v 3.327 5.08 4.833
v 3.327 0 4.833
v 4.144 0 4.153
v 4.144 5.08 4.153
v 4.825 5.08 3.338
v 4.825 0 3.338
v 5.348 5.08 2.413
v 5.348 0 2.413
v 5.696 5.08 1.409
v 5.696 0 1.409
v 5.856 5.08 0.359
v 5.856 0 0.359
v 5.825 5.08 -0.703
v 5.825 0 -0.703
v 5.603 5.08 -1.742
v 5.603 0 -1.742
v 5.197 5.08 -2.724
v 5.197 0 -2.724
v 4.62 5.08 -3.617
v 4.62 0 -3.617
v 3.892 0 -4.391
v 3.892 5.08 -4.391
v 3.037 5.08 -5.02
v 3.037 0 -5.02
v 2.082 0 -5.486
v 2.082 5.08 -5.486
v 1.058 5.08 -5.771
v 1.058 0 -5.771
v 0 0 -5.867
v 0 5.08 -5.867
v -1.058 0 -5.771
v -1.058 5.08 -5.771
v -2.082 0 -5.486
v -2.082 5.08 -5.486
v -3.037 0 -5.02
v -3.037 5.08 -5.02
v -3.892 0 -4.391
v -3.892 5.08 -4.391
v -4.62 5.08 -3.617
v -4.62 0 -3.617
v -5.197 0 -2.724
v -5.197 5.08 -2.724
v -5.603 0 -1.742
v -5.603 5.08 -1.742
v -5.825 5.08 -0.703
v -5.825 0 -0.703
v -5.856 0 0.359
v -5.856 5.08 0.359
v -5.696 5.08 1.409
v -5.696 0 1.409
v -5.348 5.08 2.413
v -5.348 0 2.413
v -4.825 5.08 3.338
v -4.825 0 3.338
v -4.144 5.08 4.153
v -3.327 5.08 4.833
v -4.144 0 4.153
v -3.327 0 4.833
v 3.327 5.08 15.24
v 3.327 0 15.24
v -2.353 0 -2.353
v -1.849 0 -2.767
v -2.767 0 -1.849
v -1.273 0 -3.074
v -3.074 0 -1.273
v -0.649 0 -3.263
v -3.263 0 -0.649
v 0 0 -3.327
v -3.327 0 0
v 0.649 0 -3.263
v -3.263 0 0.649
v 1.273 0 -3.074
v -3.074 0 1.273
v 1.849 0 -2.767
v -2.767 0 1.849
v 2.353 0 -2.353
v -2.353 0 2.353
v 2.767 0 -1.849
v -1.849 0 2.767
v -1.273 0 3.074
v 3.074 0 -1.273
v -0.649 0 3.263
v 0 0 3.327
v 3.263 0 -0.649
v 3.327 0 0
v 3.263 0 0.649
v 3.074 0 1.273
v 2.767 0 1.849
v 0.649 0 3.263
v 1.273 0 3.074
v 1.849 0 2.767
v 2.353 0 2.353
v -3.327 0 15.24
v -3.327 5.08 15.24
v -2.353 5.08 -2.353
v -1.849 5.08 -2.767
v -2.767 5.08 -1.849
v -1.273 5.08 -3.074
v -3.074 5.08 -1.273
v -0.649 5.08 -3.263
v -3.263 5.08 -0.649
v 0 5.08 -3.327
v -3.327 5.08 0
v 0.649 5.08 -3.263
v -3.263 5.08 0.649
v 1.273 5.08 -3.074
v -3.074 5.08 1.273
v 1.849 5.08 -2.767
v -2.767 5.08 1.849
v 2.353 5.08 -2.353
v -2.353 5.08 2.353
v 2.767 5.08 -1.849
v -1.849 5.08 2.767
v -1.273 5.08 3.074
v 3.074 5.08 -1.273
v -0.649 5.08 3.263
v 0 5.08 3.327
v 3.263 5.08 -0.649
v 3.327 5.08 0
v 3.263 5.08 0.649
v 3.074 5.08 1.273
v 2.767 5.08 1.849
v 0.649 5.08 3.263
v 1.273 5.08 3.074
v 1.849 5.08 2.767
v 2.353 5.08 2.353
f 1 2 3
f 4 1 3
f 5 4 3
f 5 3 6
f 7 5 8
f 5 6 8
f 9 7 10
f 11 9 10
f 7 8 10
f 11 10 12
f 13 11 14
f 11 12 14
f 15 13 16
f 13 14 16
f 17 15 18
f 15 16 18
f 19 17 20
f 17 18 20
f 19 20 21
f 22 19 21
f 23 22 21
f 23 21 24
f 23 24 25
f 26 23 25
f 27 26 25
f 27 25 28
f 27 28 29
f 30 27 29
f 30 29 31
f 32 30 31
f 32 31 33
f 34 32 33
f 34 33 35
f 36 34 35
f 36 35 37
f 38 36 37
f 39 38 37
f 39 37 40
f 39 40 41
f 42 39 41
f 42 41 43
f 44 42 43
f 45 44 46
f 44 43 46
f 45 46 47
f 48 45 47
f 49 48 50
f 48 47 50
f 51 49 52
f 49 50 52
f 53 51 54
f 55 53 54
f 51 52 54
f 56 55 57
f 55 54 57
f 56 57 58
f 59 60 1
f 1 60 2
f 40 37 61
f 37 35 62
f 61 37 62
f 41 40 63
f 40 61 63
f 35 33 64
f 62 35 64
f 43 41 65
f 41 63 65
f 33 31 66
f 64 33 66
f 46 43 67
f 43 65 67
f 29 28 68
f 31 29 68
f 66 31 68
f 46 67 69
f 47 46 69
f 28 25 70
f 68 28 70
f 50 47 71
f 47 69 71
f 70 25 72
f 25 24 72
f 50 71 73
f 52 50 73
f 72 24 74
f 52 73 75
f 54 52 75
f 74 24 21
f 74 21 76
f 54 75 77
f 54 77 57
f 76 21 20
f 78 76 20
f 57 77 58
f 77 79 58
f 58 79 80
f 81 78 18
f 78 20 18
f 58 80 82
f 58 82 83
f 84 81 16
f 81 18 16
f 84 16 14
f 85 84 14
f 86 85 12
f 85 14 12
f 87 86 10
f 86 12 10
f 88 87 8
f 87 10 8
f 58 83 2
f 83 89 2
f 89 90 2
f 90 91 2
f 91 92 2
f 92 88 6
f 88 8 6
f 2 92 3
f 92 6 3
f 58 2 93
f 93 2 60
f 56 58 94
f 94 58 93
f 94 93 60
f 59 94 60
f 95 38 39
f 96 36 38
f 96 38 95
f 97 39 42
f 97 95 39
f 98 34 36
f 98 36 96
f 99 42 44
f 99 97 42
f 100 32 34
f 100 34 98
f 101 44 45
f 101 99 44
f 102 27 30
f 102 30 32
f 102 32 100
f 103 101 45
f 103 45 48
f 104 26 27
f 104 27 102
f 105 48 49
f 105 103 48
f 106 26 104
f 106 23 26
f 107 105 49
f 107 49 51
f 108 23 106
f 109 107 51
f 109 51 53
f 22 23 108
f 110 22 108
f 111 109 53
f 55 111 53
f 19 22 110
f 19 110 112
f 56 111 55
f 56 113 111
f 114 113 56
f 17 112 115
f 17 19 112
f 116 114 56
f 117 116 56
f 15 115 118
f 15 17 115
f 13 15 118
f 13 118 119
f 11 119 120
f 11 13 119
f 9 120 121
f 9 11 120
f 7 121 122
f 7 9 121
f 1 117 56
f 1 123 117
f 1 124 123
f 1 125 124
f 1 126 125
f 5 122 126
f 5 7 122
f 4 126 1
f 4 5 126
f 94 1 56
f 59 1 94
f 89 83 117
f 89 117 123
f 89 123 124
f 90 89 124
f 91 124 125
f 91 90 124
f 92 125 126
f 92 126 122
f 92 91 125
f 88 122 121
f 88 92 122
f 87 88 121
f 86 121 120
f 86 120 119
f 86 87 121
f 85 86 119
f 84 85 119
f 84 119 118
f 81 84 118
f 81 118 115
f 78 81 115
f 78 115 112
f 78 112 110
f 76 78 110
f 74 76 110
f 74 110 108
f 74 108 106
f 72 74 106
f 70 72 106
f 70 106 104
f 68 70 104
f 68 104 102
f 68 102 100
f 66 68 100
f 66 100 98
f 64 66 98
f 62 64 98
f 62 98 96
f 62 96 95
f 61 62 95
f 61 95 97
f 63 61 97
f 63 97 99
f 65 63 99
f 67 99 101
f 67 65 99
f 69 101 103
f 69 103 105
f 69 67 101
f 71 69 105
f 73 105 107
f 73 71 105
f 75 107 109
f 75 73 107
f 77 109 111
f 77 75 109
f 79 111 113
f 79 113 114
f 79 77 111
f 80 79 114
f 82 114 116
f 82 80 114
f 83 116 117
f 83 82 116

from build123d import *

# Parameters (mm, degrees)
SKETCH1_R           = 5.8674
SKETCH1_R_2         = 3.3274
BOSS_EXTRUDE1_DEPTH = 5.08
BOSS_EXTRUDE2_DEPTH = 5.08


with BuildPart() as part:
    # Sketch1 → Boss-Extrude1 (new body)
    with BuildSketch(Plane(origin=(0, 0, 0), x_dir=(-1, 0, 0), z_dir=(0, 1, 0))):
        with Locations(Location((0, 0, 0), (0, 0, 90))):
            Circle(SKETCH1_R)
        with Locations(Location((0, 0, 0), (0, 0, 90))):
            Circle(SKETCH1_R_2, mode=Mode.SUBTRACT)
    extrude(amount=BOSS_EXTRUDE1_DEPTH)

    # Sketch2 → Boss-Extrude2 (add)
    with BuildSketch(Plane.XZ):
        with BuildLine():
            Line((-3.3274, 0), (-3.3274, 15.24))
            Line((-3.3274, 15.24), (3.3274, 15.24))
            Line((3.3274, 15.24), (3.3274, 0))
            ThreePointArc((3.3274, 0), (0, 3.3274), (-3.3274, 0))
        make_face()
    extrude(amount=-BOSS_EXTRUDE2_DEPTH)


solid = part.part
